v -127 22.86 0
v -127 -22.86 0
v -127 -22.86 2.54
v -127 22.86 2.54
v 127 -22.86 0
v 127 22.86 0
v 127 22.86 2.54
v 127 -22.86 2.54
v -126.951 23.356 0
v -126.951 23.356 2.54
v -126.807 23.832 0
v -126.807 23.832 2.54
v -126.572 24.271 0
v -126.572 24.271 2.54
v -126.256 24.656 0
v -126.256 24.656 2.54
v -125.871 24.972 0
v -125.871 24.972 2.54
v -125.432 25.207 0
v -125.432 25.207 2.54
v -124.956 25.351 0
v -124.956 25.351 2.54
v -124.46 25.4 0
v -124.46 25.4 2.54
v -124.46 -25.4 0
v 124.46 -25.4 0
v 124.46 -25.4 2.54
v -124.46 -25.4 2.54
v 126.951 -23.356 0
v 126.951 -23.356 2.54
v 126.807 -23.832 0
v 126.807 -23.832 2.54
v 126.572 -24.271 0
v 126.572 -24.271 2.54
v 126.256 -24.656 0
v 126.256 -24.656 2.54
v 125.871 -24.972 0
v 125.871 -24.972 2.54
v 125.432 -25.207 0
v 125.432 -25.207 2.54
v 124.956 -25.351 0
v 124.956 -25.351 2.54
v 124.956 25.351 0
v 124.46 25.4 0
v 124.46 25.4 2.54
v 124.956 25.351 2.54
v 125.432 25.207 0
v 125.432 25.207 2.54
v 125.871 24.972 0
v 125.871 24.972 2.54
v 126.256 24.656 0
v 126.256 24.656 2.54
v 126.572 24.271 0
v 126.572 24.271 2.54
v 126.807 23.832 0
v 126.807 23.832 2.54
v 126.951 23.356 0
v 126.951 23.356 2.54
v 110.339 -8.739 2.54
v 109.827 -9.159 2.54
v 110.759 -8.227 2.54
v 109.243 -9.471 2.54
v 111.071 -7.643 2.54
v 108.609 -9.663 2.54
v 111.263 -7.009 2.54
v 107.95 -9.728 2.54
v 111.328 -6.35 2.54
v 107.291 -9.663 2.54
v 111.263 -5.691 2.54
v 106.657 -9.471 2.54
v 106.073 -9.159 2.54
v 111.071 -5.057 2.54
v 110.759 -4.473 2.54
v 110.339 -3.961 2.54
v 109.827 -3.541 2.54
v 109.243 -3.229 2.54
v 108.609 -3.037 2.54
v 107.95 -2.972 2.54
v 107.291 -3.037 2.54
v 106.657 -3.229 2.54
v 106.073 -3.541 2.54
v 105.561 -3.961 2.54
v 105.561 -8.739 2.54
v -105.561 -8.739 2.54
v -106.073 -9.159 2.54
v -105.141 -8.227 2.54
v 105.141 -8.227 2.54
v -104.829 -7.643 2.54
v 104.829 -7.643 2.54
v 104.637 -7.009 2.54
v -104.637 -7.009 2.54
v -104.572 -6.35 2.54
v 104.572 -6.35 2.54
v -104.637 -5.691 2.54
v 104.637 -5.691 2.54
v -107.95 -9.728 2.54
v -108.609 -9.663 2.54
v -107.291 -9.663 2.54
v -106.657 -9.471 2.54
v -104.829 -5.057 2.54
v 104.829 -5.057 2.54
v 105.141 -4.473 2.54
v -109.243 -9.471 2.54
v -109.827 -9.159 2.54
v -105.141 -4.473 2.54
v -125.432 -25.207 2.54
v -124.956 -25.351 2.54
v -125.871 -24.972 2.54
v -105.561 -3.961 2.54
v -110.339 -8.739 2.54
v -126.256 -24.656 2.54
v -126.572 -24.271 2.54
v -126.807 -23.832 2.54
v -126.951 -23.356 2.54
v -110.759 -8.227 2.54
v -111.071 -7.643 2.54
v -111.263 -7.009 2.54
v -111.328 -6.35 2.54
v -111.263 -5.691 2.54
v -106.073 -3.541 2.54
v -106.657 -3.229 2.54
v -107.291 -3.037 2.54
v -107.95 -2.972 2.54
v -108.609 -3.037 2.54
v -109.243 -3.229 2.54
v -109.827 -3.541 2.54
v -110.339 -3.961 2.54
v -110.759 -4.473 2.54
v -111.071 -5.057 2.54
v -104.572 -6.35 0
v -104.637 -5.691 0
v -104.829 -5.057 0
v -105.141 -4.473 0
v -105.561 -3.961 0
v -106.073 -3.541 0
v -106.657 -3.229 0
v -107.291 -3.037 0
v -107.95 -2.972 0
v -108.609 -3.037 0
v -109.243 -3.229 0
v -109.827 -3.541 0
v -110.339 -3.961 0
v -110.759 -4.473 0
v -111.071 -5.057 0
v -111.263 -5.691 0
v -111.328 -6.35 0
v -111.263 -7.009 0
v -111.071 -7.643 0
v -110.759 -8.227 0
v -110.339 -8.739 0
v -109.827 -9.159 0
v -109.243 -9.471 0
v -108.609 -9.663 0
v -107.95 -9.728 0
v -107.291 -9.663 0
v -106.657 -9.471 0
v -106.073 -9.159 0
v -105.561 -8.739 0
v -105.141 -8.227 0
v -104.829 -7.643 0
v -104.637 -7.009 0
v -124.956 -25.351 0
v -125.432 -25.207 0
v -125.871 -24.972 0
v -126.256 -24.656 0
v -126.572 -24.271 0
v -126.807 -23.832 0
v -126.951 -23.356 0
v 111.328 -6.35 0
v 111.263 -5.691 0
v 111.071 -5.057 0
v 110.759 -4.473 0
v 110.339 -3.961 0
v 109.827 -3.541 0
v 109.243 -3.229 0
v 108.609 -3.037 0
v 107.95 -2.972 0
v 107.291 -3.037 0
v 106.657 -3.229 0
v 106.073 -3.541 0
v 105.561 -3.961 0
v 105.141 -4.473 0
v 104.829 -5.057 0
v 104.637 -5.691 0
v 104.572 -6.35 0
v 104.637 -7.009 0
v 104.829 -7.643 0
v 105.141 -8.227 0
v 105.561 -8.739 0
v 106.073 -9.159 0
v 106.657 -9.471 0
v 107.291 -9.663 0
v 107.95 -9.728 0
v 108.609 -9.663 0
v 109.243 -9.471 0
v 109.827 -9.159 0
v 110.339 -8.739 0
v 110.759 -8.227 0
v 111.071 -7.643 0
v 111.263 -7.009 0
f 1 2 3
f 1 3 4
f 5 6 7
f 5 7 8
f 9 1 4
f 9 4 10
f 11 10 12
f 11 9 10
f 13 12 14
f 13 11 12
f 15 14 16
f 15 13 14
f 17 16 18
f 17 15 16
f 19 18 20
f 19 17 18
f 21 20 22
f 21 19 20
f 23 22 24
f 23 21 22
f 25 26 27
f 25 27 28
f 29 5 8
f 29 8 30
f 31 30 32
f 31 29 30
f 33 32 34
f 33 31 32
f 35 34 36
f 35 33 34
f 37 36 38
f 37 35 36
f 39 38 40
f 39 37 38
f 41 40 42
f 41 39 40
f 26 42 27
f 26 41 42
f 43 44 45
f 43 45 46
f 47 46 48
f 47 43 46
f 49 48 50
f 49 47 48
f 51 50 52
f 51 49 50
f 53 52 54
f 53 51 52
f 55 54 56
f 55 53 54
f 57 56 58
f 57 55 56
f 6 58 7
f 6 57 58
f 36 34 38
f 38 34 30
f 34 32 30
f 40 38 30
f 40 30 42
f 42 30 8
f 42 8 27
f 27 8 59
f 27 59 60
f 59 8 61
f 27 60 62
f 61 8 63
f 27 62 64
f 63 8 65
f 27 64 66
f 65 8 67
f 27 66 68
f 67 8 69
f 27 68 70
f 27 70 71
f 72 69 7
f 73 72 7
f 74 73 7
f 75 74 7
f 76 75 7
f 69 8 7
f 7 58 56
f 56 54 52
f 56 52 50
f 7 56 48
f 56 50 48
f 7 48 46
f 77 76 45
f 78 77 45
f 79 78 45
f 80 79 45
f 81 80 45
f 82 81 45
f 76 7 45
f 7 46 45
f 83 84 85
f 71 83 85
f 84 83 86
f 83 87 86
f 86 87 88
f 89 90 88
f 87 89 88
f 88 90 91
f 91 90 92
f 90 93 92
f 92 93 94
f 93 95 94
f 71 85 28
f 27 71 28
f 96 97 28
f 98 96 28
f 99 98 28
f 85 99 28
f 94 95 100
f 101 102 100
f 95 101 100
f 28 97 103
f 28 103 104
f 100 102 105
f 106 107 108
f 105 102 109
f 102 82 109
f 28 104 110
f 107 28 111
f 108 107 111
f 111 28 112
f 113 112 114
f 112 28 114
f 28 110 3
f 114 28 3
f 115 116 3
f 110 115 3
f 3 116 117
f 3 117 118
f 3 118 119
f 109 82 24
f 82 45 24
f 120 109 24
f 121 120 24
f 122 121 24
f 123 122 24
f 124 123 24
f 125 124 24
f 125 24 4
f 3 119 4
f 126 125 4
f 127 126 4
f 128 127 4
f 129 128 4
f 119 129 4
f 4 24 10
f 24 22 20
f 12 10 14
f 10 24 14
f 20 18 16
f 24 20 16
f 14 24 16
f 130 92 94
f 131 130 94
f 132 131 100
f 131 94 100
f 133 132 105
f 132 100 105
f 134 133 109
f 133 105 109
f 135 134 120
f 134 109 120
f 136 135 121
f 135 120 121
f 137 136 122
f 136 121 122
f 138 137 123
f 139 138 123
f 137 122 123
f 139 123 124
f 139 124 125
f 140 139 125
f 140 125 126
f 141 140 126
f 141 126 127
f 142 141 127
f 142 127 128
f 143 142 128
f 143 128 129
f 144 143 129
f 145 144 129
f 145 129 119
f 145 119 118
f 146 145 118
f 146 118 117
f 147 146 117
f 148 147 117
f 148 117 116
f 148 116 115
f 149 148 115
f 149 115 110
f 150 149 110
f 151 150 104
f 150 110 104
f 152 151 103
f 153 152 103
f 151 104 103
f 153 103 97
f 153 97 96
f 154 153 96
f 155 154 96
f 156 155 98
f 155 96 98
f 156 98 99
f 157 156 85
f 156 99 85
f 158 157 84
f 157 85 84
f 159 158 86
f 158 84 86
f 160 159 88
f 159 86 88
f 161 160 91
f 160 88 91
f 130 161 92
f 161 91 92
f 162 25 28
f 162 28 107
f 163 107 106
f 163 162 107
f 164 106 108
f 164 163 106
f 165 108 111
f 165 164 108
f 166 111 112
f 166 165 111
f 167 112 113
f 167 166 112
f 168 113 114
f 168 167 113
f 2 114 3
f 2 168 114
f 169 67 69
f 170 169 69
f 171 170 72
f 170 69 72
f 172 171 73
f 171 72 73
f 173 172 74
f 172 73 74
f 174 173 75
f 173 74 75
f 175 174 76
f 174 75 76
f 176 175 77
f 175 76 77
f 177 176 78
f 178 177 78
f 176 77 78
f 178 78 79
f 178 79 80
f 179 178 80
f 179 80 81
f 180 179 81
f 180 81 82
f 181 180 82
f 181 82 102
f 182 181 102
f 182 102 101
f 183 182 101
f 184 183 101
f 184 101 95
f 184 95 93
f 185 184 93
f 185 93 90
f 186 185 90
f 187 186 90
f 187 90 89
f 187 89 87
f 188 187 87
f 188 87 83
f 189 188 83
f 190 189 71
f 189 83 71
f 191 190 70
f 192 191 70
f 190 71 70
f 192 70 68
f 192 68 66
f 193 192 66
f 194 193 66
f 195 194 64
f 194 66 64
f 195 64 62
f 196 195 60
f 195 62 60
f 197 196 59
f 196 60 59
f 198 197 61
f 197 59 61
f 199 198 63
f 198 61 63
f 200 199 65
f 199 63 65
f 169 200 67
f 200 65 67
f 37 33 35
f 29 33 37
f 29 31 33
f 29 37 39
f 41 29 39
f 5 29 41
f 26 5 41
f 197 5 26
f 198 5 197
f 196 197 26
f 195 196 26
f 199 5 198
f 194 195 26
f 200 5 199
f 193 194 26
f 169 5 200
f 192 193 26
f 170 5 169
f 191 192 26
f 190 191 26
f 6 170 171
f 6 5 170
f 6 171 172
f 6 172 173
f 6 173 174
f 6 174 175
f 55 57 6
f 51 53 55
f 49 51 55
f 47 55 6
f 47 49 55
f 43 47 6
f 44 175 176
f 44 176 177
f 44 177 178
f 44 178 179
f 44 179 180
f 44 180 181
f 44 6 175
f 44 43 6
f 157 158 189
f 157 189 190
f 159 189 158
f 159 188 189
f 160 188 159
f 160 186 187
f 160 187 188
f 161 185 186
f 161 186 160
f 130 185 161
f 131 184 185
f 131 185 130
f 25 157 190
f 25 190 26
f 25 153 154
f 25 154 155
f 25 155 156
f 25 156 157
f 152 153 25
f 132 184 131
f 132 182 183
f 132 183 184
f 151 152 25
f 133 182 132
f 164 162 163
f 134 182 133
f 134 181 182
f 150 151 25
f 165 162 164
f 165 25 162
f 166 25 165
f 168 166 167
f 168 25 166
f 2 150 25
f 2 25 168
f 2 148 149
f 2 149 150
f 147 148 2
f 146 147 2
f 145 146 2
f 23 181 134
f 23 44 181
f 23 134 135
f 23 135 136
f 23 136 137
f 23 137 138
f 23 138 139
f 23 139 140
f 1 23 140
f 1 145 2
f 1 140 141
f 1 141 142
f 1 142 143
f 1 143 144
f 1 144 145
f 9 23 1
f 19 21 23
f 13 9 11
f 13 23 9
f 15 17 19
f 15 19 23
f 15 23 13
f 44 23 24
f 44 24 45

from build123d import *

# Parameters (mm, degrees)
BOSS_EXTRUDE1_DEPTH = 2.54
SKETCH3_R           = 3.3782
CUT_EXTRUDE1_DEPTH  = 130.54
SKETCH4_R           = 3.3782
CUT_EXTRUDE2_DEPTH  = 130.54


with BuildPart() as part:
    # Sketch2 → Boss-Extrude1 (new body)
    with BuildSketch(Plane.XY):
        with BuildLine():
            Line((-124.46, 25.4), (124.46, 25.4))
            ThreePointArc((124.46, 25.4), (126.256051224, 24.656051224), (127, 22.86))
            Line((127, 22.86), (127, -22.86))
            ThreePointArc((127, -22.86), (126.256051224, -24.656051224), (124.46, -25.4))
            Line((124.46, -25.4), (-124.46, -25.4))
            ThreePointArc((-124.46, -25.4), (-126.256051224, -24.656051224), (-127, -22.86))
            Line((-127, -22.86), (-127, 22.86))
            ThreePointArc((-127, 22.86), (-126.256051224, 24.656051224), (-124.46, 25.4))
        make_face()
    extrude(amount=BOSS_EXTRUDE1_DEPTH)

    # Sketch3 → Cut-Extrude1 (cut, through all)
    with BuildSketch(Plane.XY.offset(2.54)):
        with Locations((-107.95, -6.35)):
            Circle(SKETCH3_R)
    extrude(amount=-CUT_EXTRUDE1_DEPTH, mode=Mode.SUBTRACT)

    # Sketch4 → Cut-Extrude2 (cut, through all)
    with BuildSketch(Plane.XY.offset(2.54)):
        with Locations((107.95, -6.35)):
            Circle(SKETCH4_R)
    extrude(amount=-CUT_EXTRUDE2_DEPTH, mode=Mode.SUBTRACT)


solid = part.part
